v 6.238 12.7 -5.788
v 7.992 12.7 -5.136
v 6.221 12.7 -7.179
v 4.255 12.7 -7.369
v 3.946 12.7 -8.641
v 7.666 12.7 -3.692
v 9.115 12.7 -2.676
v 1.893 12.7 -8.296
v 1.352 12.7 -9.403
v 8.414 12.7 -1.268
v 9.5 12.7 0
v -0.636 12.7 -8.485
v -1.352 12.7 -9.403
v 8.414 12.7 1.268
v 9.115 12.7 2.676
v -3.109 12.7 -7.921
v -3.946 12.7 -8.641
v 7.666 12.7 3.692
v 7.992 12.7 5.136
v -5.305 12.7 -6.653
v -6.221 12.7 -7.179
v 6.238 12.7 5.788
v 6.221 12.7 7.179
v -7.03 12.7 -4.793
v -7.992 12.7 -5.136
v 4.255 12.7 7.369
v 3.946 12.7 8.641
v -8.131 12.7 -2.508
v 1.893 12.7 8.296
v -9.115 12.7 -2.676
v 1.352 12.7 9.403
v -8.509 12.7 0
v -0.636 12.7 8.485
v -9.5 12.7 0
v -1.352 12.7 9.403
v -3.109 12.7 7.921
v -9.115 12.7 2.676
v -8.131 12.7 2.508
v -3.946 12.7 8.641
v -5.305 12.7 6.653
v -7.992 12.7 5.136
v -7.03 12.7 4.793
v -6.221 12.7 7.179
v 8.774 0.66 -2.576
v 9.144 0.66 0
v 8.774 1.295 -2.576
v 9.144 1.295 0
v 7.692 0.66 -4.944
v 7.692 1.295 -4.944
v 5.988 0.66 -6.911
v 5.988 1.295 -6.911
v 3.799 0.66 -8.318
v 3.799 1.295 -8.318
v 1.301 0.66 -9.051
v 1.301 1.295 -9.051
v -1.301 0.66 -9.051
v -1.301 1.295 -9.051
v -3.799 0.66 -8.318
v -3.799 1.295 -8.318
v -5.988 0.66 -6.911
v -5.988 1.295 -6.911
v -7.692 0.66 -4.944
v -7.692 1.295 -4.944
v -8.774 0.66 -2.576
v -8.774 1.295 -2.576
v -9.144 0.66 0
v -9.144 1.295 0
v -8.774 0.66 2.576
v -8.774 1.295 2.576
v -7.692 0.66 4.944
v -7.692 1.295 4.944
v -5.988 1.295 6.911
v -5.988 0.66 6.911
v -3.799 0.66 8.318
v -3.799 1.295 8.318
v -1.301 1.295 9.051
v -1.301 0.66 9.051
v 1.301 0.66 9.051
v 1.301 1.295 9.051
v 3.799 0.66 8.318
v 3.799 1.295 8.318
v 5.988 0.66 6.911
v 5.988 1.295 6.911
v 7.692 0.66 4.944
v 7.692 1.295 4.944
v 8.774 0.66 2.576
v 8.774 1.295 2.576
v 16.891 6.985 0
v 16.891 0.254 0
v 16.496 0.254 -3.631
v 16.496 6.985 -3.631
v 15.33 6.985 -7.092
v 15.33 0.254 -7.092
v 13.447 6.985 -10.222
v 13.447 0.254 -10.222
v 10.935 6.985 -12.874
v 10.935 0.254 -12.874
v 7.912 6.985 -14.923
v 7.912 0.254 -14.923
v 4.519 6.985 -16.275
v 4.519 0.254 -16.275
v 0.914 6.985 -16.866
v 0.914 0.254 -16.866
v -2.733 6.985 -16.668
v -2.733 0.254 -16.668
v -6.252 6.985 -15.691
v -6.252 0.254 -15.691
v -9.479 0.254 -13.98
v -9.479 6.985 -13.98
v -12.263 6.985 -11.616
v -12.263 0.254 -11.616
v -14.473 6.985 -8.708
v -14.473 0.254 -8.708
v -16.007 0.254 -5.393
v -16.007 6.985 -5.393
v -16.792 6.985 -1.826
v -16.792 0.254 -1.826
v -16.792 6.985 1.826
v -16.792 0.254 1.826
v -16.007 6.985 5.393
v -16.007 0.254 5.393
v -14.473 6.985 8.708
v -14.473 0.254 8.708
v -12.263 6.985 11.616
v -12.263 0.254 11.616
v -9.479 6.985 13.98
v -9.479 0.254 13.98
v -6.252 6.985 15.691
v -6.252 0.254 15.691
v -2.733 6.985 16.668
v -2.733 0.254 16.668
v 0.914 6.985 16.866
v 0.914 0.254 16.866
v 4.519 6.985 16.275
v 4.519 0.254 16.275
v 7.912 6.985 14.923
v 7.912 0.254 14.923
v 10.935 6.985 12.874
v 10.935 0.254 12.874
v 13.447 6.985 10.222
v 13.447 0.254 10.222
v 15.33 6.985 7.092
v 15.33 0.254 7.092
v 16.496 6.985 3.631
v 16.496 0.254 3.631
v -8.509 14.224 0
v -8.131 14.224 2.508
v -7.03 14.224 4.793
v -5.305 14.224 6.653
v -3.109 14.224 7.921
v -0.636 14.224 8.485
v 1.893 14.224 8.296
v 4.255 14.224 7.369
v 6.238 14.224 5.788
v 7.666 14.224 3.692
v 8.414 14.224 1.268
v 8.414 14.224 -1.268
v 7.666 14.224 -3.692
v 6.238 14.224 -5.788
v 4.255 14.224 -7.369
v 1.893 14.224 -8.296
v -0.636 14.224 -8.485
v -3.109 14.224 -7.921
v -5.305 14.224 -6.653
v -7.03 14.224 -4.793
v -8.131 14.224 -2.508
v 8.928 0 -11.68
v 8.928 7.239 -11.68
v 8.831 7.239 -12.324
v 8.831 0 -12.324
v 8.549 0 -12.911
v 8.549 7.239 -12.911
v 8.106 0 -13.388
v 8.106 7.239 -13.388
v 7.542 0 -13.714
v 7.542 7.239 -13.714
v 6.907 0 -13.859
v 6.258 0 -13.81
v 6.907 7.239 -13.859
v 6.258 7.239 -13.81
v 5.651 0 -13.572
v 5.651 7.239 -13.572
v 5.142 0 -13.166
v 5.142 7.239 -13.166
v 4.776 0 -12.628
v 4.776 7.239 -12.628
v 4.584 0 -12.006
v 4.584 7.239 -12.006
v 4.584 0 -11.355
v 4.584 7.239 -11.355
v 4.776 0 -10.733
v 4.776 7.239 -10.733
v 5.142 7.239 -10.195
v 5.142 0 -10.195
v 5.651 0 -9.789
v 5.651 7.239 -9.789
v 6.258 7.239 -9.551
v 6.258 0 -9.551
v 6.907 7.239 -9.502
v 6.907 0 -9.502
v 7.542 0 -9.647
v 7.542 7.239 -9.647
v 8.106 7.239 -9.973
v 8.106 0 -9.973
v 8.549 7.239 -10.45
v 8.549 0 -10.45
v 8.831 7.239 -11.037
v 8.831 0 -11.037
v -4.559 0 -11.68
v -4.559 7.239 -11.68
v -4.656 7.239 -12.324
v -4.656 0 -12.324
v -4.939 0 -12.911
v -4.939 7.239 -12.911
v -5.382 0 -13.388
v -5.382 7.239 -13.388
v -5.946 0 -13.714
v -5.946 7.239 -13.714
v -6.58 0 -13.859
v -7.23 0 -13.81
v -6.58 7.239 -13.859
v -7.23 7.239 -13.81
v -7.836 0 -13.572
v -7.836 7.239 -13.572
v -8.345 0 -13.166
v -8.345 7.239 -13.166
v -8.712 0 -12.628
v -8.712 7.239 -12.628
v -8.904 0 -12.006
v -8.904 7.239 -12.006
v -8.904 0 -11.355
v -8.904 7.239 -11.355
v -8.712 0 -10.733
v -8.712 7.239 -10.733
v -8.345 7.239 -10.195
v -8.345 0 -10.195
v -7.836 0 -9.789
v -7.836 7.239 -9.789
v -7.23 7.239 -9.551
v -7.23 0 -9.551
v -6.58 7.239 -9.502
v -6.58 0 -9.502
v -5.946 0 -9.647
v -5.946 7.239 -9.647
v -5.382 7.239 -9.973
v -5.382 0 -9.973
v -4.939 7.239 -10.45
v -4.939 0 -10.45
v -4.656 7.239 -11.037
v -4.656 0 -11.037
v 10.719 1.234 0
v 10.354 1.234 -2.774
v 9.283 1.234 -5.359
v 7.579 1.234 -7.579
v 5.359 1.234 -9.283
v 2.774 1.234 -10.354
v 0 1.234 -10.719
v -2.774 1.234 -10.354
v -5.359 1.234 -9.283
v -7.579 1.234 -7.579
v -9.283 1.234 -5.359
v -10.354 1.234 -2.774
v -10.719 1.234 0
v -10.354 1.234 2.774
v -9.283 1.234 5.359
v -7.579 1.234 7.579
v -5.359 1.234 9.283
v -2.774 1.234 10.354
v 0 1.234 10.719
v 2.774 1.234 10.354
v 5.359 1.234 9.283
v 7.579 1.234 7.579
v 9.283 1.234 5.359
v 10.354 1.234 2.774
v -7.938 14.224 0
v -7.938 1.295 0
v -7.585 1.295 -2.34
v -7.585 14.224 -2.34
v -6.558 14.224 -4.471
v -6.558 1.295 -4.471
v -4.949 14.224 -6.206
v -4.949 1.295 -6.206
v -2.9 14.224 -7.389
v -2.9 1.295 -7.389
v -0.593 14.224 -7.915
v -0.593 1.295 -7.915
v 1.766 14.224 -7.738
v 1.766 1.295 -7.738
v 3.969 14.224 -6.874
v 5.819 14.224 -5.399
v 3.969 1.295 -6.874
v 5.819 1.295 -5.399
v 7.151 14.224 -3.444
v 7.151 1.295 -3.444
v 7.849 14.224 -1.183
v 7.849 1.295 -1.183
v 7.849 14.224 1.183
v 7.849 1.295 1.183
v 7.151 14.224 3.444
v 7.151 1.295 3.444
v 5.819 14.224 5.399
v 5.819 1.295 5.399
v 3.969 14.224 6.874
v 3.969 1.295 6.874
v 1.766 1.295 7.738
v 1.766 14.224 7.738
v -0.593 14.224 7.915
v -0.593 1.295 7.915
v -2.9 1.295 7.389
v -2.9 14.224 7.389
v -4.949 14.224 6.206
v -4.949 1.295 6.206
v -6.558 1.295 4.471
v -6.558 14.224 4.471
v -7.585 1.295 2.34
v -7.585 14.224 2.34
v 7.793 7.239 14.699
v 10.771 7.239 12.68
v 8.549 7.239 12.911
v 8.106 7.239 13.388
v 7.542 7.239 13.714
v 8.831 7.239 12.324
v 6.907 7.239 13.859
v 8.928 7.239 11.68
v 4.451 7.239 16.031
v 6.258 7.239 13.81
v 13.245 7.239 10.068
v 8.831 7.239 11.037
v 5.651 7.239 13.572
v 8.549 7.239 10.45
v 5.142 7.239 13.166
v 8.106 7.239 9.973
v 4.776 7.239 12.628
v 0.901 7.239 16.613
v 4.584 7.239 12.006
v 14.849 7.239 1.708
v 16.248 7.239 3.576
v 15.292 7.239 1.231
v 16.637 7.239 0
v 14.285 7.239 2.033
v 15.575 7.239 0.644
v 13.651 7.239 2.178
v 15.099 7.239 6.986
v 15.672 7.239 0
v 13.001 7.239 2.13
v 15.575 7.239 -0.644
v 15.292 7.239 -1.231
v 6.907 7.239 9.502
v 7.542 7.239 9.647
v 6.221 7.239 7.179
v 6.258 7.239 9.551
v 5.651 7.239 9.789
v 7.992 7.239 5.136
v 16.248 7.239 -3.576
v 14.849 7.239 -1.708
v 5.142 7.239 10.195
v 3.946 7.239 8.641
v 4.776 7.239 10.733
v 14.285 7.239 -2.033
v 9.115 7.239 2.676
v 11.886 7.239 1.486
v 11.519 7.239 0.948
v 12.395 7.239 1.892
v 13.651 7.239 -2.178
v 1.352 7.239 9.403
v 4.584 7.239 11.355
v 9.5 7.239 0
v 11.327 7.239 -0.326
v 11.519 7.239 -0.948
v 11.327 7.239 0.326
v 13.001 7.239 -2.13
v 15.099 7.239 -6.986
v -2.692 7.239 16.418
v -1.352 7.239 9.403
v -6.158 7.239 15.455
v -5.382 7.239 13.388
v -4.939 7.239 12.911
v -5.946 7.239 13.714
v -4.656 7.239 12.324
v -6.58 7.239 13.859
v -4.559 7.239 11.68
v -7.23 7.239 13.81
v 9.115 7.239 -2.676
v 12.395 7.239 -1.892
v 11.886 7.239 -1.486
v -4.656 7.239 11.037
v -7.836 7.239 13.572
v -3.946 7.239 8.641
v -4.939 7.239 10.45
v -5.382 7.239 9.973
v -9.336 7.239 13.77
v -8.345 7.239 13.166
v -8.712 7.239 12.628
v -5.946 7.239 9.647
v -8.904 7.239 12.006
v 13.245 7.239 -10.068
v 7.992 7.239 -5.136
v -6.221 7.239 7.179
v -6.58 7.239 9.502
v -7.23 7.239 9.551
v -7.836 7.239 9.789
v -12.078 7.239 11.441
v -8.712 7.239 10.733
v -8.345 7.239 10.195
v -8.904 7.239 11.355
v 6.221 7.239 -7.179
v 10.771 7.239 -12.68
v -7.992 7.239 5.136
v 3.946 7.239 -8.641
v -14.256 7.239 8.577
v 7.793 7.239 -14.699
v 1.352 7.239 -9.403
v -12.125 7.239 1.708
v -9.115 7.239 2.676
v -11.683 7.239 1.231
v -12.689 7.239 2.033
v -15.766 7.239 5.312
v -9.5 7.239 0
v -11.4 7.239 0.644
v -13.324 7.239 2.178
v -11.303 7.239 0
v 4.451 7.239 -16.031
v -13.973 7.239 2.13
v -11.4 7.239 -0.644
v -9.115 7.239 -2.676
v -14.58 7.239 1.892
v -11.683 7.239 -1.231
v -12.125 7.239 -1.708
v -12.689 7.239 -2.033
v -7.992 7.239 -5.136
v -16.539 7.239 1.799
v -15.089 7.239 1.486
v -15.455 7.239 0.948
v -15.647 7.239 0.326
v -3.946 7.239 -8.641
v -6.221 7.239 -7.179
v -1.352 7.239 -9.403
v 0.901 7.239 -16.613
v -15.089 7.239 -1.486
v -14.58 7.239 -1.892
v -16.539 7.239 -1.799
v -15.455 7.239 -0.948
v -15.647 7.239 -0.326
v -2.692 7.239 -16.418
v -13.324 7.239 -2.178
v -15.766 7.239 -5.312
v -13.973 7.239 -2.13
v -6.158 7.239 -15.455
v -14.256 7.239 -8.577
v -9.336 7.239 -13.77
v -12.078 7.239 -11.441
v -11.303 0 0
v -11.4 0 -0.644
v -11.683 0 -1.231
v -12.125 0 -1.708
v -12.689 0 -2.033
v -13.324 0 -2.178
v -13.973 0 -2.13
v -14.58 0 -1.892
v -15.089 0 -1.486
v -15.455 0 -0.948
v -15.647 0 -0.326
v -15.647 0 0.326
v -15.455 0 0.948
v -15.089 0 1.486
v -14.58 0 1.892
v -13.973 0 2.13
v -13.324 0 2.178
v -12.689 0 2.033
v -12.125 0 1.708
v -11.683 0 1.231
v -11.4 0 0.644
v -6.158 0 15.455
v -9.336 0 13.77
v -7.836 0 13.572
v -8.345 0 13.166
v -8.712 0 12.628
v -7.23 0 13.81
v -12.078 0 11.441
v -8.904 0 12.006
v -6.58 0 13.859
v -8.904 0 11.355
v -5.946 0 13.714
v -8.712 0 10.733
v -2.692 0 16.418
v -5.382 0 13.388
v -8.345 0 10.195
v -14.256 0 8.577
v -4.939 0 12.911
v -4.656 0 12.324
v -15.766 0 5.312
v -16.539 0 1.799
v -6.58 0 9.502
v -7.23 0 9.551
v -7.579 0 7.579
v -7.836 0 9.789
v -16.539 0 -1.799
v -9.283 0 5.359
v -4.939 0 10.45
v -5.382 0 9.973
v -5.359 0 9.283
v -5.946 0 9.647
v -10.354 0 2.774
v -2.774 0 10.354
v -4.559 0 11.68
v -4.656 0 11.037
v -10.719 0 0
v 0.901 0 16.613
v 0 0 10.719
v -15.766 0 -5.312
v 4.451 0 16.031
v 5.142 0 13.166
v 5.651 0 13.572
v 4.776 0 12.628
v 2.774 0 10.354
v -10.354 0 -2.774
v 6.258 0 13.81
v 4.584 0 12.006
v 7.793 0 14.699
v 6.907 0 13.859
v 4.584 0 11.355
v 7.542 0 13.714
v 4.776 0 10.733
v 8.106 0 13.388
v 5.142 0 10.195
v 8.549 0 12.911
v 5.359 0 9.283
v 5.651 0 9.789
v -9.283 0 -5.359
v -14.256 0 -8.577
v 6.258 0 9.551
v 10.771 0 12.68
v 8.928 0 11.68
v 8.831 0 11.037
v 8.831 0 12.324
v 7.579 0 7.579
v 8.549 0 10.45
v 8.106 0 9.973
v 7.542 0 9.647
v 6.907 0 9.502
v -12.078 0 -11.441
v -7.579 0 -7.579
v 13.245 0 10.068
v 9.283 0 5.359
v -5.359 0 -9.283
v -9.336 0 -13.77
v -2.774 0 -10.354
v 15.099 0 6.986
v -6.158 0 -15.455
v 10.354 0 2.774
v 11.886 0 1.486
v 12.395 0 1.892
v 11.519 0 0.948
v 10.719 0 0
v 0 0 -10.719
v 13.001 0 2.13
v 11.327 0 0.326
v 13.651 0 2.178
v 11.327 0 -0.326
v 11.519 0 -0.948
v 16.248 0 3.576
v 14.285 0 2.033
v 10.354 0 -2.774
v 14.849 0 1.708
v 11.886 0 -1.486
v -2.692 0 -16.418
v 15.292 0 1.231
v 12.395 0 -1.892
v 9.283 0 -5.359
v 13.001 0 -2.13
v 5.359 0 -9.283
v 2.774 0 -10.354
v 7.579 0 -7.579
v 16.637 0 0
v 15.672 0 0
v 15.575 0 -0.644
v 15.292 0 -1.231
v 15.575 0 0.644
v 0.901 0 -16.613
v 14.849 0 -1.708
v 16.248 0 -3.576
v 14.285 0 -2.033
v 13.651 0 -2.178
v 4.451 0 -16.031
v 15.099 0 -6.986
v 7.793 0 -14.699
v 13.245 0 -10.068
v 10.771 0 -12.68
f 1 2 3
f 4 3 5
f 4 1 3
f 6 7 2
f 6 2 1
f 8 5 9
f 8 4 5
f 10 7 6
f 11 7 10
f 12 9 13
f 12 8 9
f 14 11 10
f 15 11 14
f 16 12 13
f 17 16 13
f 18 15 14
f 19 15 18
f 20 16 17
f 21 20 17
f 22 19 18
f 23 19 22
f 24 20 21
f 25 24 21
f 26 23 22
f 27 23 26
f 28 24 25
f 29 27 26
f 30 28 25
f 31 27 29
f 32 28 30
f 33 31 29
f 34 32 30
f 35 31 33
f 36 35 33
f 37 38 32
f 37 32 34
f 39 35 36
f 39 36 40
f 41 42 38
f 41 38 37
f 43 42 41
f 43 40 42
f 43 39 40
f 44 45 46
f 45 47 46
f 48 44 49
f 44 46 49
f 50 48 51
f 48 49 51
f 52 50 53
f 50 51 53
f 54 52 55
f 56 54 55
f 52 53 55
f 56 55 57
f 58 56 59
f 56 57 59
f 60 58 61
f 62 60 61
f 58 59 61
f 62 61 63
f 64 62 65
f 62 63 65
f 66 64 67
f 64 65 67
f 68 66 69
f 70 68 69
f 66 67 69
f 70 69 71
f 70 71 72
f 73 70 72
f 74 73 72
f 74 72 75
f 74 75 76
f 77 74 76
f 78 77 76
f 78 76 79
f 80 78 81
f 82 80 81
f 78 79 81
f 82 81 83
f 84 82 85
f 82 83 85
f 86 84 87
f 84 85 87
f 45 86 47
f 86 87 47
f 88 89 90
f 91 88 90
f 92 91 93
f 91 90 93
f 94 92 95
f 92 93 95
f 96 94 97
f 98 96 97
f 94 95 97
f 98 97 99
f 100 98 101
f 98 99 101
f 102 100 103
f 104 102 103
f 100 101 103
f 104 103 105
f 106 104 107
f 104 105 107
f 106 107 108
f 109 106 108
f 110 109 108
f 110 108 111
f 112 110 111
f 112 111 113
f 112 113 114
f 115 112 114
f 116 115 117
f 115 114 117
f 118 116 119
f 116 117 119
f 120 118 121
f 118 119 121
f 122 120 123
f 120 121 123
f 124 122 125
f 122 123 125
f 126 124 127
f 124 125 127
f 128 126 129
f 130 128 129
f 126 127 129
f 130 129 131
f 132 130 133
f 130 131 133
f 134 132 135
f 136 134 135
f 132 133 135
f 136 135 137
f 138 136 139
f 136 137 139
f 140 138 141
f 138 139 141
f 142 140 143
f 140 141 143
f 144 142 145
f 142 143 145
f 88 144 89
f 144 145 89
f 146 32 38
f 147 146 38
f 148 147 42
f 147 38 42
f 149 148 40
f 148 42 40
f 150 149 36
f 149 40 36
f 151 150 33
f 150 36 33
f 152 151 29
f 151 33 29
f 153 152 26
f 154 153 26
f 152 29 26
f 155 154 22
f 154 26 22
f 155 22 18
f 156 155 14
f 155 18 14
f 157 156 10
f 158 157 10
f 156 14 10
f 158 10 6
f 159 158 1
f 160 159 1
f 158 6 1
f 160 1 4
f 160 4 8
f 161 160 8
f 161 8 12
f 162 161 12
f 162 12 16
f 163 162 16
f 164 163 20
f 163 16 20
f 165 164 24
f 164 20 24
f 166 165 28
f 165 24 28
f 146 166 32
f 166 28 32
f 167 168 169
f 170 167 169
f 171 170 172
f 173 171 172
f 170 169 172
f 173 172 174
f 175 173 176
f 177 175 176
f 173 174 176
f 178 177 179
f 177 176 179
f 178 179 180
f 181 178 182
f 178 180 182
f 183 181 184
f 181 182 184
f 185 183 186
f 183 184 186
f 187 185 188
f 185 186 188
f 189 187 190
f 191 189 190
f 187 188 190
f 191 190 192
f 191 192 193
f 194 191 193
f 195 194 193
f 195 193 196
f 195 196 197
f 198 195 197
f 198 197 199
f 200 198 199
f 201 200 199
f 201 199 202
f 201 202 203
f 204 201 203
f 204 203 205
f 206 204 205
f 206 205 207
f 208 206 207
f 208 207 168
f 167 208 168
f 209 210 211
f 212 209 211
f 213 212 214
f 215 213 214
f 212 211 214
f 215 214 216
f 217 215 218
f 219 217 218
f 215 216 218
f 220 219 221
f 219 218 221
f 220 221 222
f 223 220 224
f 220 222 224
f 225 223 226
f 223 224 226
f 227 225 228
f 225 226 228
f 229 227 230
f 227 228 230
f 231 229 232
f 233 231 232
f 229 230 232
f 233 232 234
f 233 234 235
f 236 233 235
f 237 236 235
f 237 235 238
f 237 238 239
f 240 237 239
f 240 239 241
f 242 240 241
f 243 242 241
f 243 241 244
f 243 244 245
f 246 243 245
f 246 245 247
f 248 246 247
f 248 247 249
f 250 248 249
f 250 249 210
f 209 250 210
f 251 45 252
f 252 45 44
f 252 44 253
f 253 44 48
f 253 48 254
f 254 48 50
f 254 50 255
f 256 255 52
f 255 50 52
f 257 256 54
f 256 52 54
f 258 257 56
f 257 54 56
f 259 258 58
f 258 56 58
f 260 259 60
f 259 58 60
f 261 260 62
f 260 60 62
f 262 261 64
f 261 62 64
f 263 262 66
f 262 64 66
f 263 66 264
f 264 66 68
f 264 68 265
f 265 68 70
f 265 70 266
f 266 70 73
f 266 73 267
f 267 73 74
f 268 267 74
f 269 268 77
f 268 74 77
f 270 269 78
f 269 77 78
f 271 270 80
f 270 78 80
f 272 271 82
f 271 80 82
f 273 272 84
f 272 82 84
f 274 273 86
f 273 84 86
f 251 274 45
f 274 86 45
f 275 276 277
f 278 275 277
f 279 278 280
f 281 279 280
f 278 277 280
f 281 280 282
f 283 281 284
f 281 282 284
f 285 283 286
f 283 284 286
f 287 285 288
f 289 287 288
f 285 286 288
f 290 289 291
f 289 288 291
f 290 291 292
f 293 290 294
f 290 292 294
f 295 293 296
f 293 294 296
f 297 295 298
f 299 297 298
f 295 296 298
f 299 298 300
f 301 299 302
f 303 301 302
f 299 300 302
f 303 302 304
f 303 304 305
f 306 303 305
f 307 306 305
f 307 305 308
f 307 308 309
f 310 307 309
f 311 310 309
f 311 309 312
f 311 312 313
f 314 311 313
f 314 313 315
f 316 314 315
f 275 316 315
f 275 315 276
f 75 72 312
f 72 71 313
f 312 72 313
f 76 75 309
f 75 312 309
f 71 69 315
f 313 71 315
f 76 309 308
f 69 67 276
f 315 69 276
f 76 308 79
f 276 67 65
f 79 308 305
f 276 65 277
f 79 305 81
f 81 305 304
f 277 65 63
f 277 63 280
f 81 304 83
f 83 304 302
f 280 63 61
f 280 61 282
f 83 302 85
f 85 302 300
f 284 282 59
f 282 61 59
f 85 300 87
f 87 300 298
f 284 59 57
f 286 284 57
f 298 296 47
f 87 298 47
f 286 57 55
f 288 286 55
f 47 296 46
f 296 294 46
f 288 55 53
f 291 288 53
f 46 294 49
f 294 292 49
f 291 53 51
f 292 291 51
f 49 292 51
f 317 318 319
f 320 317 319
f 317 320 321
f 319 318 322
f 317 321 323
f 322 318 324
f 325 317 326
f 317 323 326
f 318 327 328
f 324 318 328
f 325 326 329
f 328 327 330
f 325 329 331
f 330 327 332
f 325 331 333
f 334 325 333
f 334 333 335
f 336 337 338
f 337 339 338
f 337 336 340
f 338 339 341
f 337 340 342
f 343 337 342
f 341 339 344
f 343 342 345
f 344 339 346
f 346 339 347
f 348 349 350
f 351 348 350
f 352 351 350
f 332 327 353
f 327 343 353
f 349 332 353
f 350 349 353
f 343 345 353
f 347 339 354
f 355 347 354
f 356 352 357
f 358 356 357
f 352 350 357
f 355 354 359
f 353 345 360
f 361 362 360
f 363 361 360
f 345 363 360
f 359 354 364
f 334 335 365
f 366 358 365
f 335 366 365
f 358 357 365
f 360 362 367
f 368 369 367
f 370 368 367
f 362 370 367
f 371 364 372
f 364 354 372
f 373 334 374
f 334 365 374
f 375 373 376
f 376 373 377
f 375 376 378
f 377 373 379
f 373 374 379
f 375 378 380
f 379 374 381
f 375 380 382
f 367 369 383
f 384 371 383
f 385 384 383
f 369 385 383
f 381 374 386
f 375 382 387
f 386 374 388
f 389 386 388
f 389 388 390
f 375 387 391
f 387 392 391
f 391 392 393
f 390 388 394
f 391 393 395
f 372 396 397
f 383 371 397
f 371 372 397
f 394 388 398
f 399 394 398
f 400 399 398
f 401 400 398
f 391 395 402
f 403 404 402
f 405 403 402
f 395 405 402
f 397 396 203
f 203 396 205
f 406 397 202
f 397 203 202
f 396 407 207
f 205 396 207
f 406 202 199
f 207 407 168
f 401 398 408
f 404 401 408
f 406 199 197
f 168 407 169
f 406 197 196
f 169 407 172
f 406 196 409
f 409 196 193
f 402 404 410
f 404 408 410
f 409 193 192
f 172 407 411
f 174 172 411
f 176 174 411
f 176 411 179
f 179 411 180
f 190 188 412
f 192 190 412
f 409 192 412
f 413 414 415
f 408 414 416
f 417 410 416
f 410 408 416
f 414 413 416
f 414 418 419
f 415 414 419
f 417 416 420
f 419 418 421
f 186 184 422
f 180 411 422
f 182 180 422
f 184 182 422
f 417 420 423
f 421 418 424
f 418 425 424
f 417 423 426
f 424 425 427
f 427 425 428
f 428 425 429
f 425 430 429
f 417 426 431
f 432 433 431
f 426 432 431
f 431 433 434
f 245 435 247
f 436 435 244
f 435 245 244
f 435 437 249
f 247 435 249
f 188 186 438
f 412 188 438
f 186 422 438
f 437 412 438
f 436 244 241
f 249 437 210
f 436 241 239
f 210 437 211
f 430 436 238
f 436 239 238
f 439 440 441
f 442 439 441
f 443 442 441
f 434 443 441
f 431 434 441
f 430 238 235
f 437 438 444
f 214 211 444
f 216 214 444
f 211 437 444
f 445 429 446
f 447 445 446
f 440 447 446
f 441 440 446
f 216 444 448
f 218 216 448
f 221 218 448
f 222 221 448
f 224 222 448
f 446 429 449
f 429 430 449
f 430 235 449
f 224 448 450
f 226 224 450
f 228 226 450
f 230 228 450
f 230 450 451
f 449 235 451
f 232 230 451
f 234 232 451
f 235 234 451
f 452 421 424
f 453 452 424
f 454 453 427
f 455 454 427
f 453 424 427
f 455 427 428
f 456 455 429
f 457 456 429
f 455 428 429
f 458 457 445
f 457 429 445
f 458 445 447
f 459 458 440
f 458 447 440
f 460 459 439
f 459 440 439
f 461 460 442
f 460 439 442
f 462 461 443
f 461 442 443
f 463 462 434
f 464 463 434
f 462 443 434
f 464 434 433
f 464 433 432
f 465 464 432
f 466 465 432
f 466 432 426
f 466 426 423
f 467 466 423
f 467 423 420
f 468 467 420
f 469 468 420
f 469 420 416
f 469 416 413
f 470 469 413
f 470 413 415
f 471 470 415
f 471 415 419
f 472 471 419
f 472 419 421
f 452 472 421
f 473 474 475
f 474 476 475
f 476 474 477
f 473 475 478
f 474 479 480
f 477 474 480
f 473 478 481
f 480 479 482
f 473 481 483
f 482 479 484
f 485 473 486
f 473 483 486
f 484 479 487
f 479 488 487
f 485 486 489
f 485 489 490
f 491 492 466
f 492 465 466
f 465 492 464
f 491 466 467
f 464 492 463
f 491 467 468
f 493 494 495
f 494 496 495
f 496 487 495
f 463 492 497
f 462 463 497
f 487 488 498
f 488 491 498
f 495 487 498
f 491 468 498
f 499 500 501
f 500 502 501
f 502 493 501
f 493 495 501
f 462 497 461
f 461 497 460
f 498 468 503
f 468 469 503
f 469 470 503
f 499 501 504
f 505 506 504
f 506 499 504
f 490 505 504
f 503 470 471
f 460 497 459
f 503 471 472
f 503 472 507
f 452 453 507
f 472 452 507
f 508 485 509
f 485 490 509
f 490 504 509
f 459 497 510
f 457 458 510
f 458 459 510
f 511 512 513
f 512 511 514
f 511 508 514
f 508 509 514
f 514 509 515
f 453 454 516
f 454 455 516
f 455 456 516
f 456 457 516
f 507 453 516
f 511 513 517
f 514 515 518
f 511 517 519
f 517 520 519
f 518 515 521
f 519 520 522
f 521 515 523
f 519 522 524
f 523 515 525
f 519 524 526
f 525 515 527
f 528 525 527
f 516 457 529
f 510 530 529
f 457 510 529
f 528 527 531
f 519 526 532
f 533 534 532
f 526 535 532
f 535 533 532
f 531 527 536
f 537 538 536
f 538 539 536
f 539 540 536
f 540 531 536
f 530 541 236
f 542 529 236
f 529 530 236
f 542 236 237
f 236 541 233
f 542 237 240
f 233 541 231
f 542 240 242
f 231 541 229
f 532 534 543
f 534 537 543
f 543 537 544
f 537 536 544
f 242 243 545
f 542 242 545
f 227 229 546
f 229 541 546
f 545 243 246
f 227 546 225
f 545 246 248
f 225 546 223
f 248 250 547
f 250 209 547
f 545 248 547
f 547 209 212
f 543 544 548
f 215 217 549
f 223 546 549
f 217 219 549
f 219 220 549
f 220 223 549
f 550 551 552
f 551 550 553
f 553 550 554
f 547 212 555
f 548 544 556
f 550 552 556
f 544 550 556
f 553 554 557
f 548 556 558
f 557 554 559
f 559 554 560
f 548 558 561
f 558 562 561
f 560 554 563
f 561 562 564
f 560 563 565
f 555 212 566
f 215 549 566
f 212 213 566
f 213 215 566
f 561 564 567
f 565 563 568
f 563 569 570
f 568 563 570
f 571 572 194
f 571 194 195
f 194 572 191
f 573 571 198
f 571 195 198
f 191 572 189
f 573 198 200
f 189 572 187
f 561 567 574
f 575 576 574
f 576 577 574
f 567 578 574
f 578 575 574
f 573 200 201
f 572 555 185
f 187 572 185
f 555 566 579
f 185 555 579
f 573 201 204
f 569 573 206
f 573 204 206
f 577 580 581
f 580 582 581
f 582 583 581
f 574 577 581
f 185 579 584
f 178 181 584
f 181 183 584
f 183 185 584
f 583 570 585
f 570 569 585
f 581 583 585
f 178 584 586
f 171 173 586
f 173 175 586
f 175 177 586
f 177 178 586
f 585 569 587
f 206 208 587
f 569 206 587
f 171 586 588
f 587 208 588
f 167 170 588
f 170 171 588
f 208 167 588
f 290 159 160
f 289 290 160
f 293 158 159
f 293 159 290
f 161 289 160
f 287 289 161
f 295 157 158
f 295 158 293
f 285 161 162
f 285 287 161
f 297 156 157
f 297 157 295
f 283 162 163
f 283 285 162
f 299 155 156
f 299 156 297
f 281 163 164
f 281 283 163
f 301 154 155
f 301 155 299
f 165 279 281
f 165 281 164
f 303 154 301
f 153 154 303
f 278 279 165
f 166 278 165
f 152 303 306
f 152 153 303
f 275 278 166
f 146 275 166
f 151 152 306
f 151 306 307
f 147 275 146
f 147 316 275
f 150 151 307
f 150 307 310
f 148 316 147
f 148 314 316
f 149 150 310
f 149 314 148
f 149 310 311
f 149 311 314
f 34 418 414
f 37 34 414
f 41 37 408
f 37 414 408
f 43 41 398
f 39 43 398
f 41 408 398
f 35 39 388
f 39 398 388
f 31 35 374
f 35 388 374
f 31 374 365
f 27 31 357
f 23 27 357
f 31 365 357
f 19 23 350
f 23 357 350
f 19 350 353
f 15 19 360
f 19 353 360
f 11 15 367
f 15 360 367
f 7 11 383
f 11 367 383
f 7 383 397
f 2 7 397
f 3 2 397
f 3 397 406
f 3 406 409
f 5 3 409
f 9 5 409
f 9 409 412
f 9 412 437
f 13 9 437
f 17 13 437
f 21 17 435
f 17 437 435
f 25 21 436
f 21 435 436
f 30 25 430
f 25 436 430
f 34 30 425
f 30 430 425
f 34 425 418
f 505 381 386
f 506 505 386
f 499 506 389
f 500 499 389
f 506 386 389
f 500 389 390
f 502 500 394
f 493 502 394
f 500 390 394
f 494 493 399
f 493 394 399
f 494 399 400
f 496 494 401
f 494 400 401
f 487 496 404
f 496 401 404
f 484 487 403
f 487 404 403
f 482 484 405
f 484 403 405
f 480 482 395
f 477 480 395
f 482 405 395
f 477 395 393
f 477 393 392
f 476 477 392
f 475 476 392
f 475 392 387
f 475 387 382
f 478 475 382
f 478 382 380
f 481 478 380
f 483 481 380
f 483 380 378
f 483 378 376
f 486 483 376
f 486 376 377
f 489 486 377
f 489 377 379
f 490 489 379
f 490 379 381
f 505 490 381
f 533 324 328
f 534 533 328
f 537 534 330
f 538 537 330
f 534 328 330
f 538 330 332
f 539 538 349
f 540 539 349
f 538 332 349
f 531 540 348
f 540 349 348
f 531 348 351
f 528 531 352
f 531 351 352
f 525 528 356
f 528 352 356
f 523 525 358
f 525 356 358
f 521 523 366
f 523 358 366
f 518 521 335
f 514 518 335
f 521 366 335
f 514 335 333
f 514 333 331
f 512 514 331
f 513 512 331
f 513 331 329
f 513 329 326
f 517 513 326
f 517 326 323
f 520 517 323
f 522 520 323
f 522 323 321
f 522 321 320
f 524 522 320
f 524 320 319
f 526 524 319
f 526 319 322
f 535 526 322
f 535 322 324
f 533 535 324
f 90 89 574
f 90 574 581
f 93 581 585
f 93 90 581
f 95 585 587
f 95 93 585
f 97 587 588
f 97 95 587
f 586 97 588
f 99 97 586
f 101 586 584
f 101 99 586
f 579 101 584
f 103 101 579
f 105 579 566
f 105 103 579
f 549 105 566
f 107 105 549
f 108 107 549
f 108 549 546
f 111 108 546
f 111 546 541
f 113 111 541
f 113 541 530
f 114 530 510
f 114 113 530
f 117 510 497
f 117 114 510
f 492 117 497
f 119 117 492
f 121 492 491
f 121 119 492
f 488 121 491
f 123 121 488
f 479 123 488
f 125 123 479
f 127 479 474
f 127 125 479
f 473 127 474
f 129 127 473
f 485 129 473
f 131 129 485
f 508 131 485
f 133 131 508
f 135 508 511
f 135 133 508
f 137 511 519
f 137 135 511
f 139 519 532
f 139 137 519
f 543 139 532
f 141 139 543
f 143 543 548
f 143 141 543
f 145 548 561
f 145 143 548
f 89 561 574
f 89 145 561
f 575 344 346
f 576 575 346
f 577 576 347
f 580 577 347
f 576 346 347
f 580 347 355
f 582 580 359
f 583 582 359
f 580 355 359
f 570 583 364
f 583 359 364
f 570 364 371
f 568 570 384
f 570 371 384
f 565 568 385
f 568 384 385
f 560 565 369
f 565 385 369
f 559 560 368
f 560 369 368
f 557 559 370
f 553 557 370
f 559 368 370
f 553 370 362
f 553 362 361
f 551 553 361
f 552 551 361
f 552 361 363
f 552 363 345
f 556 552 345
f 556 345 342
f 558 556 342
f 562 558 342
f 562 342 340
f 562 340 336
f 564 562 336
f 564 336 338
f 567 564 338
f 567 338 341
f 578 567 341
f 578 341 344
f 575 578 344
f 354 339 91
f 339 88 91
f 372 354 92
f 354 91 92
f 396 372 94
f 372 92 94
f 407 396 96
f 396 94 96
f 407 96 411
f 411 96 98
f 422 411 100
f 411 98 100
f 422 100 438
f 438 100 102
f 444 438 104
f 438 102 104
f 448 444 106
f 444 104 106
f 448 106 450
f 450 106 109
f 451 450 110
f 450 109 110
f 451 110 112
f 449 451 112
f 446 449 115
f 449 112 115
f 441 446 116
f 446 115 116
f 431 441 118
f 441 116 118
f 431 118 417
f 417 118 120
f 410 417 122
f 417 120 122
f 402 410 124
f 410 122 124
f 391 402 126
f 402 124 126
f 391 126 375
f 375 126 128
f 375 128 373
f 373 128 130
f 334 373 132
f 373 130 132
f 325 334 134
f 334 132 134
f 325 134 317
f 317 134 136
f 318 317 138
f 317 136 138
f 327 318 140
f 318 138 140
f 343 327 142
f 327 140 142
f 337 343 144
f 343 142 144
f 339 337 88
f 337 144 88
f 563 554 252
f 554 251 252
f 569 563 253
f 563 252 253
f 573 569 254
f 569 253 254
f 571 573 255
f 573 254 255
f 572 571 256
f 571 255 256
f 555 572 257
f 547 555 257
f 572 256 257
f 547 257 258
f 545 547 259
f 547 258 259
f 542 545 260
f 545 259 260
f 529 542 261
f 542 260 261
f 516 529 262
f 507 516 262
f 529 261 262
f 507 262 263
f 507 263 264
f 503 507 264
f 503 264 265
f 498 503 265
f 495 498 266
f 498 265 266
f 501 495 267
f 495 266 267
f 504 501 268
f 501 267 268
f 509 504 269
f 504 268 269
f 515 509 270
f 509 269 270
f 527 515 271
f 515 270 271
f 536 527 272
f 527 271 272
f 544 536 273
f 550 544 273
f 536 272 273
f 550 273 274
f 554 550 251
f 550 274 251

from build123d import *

# Parameters (mm, degrees)
SKETCH2_R                = 9.4996
BOSS_EXTRUDE1_DEPTH      = 5.461
SKETCH3_R                = 8.509
BOSS_EXTRUDE2_DEPTH      = 1.524
M13_CLEARANCE_HOLE1_D    = 15.875
M4_CLEARANCE_HOLE1_D     = 4.3688
M4_CLEARANCE_HOLE1_DEPTH = 14.224
CHAMFER1_SIZE            = 0.254


with BuildPart() as part:
    # Sketch1 → Revolve1 (revolve)
    with BuildSketch(Plane(origin=(0, 0, 0), x_dir=(-1, 0, 0), z_dir=(0, 0, -1))):
        Polygon((-9.144, 1.2954), (0, 1.2954), (0, 7.239), (-16.637, 7.239), (-16.891, 6.985), (-16.891, 0), (-10.7188, 0), (-10.7188, 1.233580325), (-9.144, 0.6604), align=None)
    revolve(axis=Axis((0, 0, 0), (0, 1, 0)))

    # Sketch2 → Boss-Extrude1 (add)
    with BuildSketch(Plane(origin=(0, 7.239, 0), x_dir=(-1, 0, 0), z_dir=(0, 1, 0))):
        Circle(SKETCH2_R)
    extrude(amount=BOSS_EXTRUDE1_DEPTH)

    # Sketch3 → Boss-Extrude2 (add)
    with BuildSketch(Plane(origin=(0, 12.7, 0), x_dir=(-1, 0, 0), z_dir=(0, 1, 0))):
        Circle(SKETCH3_R)
    extrude(amount=BOSS_EXTRUDE2_DEPTH)

    # M13 Clearance Hole1 (through all)
    with Locations(Plane(origin=(0, 14.224, 0), x_dir=(1, 0, 0), z_dir=(0, 1, 0))):
        with Locations((0, 0)):
            Hole(M13_CLEARANCE_HOLE1_D / 2)

    # M4 Clearance Hole1
    with Locations(Plane(origin=(0, 0, 0), x_dir=(-1, 0, 0), z_dir=(0, -1, 0))):
        with Locations((-13.4874, 0), (-6.7437, -11.680431031), (6.7437, -11.680431031), (13.4874, 0), (6.7437, 11.680431031), (-6.7437, 11.680431031)):
            Hole(M4_CLEARANCE_HOLE1_D / 2, depth=M4_CLEARANCE_HOLE1_DEPTH)

    # Chamfer1
    chamfer1_edges = [part.edges().sort_by_distance(p)[0] for p in [
        (-16.891, 0, 0),
    ]]
    chamfer(chamfer1_edges, length=CHAMFER1_SIZE)


solid = part.part
